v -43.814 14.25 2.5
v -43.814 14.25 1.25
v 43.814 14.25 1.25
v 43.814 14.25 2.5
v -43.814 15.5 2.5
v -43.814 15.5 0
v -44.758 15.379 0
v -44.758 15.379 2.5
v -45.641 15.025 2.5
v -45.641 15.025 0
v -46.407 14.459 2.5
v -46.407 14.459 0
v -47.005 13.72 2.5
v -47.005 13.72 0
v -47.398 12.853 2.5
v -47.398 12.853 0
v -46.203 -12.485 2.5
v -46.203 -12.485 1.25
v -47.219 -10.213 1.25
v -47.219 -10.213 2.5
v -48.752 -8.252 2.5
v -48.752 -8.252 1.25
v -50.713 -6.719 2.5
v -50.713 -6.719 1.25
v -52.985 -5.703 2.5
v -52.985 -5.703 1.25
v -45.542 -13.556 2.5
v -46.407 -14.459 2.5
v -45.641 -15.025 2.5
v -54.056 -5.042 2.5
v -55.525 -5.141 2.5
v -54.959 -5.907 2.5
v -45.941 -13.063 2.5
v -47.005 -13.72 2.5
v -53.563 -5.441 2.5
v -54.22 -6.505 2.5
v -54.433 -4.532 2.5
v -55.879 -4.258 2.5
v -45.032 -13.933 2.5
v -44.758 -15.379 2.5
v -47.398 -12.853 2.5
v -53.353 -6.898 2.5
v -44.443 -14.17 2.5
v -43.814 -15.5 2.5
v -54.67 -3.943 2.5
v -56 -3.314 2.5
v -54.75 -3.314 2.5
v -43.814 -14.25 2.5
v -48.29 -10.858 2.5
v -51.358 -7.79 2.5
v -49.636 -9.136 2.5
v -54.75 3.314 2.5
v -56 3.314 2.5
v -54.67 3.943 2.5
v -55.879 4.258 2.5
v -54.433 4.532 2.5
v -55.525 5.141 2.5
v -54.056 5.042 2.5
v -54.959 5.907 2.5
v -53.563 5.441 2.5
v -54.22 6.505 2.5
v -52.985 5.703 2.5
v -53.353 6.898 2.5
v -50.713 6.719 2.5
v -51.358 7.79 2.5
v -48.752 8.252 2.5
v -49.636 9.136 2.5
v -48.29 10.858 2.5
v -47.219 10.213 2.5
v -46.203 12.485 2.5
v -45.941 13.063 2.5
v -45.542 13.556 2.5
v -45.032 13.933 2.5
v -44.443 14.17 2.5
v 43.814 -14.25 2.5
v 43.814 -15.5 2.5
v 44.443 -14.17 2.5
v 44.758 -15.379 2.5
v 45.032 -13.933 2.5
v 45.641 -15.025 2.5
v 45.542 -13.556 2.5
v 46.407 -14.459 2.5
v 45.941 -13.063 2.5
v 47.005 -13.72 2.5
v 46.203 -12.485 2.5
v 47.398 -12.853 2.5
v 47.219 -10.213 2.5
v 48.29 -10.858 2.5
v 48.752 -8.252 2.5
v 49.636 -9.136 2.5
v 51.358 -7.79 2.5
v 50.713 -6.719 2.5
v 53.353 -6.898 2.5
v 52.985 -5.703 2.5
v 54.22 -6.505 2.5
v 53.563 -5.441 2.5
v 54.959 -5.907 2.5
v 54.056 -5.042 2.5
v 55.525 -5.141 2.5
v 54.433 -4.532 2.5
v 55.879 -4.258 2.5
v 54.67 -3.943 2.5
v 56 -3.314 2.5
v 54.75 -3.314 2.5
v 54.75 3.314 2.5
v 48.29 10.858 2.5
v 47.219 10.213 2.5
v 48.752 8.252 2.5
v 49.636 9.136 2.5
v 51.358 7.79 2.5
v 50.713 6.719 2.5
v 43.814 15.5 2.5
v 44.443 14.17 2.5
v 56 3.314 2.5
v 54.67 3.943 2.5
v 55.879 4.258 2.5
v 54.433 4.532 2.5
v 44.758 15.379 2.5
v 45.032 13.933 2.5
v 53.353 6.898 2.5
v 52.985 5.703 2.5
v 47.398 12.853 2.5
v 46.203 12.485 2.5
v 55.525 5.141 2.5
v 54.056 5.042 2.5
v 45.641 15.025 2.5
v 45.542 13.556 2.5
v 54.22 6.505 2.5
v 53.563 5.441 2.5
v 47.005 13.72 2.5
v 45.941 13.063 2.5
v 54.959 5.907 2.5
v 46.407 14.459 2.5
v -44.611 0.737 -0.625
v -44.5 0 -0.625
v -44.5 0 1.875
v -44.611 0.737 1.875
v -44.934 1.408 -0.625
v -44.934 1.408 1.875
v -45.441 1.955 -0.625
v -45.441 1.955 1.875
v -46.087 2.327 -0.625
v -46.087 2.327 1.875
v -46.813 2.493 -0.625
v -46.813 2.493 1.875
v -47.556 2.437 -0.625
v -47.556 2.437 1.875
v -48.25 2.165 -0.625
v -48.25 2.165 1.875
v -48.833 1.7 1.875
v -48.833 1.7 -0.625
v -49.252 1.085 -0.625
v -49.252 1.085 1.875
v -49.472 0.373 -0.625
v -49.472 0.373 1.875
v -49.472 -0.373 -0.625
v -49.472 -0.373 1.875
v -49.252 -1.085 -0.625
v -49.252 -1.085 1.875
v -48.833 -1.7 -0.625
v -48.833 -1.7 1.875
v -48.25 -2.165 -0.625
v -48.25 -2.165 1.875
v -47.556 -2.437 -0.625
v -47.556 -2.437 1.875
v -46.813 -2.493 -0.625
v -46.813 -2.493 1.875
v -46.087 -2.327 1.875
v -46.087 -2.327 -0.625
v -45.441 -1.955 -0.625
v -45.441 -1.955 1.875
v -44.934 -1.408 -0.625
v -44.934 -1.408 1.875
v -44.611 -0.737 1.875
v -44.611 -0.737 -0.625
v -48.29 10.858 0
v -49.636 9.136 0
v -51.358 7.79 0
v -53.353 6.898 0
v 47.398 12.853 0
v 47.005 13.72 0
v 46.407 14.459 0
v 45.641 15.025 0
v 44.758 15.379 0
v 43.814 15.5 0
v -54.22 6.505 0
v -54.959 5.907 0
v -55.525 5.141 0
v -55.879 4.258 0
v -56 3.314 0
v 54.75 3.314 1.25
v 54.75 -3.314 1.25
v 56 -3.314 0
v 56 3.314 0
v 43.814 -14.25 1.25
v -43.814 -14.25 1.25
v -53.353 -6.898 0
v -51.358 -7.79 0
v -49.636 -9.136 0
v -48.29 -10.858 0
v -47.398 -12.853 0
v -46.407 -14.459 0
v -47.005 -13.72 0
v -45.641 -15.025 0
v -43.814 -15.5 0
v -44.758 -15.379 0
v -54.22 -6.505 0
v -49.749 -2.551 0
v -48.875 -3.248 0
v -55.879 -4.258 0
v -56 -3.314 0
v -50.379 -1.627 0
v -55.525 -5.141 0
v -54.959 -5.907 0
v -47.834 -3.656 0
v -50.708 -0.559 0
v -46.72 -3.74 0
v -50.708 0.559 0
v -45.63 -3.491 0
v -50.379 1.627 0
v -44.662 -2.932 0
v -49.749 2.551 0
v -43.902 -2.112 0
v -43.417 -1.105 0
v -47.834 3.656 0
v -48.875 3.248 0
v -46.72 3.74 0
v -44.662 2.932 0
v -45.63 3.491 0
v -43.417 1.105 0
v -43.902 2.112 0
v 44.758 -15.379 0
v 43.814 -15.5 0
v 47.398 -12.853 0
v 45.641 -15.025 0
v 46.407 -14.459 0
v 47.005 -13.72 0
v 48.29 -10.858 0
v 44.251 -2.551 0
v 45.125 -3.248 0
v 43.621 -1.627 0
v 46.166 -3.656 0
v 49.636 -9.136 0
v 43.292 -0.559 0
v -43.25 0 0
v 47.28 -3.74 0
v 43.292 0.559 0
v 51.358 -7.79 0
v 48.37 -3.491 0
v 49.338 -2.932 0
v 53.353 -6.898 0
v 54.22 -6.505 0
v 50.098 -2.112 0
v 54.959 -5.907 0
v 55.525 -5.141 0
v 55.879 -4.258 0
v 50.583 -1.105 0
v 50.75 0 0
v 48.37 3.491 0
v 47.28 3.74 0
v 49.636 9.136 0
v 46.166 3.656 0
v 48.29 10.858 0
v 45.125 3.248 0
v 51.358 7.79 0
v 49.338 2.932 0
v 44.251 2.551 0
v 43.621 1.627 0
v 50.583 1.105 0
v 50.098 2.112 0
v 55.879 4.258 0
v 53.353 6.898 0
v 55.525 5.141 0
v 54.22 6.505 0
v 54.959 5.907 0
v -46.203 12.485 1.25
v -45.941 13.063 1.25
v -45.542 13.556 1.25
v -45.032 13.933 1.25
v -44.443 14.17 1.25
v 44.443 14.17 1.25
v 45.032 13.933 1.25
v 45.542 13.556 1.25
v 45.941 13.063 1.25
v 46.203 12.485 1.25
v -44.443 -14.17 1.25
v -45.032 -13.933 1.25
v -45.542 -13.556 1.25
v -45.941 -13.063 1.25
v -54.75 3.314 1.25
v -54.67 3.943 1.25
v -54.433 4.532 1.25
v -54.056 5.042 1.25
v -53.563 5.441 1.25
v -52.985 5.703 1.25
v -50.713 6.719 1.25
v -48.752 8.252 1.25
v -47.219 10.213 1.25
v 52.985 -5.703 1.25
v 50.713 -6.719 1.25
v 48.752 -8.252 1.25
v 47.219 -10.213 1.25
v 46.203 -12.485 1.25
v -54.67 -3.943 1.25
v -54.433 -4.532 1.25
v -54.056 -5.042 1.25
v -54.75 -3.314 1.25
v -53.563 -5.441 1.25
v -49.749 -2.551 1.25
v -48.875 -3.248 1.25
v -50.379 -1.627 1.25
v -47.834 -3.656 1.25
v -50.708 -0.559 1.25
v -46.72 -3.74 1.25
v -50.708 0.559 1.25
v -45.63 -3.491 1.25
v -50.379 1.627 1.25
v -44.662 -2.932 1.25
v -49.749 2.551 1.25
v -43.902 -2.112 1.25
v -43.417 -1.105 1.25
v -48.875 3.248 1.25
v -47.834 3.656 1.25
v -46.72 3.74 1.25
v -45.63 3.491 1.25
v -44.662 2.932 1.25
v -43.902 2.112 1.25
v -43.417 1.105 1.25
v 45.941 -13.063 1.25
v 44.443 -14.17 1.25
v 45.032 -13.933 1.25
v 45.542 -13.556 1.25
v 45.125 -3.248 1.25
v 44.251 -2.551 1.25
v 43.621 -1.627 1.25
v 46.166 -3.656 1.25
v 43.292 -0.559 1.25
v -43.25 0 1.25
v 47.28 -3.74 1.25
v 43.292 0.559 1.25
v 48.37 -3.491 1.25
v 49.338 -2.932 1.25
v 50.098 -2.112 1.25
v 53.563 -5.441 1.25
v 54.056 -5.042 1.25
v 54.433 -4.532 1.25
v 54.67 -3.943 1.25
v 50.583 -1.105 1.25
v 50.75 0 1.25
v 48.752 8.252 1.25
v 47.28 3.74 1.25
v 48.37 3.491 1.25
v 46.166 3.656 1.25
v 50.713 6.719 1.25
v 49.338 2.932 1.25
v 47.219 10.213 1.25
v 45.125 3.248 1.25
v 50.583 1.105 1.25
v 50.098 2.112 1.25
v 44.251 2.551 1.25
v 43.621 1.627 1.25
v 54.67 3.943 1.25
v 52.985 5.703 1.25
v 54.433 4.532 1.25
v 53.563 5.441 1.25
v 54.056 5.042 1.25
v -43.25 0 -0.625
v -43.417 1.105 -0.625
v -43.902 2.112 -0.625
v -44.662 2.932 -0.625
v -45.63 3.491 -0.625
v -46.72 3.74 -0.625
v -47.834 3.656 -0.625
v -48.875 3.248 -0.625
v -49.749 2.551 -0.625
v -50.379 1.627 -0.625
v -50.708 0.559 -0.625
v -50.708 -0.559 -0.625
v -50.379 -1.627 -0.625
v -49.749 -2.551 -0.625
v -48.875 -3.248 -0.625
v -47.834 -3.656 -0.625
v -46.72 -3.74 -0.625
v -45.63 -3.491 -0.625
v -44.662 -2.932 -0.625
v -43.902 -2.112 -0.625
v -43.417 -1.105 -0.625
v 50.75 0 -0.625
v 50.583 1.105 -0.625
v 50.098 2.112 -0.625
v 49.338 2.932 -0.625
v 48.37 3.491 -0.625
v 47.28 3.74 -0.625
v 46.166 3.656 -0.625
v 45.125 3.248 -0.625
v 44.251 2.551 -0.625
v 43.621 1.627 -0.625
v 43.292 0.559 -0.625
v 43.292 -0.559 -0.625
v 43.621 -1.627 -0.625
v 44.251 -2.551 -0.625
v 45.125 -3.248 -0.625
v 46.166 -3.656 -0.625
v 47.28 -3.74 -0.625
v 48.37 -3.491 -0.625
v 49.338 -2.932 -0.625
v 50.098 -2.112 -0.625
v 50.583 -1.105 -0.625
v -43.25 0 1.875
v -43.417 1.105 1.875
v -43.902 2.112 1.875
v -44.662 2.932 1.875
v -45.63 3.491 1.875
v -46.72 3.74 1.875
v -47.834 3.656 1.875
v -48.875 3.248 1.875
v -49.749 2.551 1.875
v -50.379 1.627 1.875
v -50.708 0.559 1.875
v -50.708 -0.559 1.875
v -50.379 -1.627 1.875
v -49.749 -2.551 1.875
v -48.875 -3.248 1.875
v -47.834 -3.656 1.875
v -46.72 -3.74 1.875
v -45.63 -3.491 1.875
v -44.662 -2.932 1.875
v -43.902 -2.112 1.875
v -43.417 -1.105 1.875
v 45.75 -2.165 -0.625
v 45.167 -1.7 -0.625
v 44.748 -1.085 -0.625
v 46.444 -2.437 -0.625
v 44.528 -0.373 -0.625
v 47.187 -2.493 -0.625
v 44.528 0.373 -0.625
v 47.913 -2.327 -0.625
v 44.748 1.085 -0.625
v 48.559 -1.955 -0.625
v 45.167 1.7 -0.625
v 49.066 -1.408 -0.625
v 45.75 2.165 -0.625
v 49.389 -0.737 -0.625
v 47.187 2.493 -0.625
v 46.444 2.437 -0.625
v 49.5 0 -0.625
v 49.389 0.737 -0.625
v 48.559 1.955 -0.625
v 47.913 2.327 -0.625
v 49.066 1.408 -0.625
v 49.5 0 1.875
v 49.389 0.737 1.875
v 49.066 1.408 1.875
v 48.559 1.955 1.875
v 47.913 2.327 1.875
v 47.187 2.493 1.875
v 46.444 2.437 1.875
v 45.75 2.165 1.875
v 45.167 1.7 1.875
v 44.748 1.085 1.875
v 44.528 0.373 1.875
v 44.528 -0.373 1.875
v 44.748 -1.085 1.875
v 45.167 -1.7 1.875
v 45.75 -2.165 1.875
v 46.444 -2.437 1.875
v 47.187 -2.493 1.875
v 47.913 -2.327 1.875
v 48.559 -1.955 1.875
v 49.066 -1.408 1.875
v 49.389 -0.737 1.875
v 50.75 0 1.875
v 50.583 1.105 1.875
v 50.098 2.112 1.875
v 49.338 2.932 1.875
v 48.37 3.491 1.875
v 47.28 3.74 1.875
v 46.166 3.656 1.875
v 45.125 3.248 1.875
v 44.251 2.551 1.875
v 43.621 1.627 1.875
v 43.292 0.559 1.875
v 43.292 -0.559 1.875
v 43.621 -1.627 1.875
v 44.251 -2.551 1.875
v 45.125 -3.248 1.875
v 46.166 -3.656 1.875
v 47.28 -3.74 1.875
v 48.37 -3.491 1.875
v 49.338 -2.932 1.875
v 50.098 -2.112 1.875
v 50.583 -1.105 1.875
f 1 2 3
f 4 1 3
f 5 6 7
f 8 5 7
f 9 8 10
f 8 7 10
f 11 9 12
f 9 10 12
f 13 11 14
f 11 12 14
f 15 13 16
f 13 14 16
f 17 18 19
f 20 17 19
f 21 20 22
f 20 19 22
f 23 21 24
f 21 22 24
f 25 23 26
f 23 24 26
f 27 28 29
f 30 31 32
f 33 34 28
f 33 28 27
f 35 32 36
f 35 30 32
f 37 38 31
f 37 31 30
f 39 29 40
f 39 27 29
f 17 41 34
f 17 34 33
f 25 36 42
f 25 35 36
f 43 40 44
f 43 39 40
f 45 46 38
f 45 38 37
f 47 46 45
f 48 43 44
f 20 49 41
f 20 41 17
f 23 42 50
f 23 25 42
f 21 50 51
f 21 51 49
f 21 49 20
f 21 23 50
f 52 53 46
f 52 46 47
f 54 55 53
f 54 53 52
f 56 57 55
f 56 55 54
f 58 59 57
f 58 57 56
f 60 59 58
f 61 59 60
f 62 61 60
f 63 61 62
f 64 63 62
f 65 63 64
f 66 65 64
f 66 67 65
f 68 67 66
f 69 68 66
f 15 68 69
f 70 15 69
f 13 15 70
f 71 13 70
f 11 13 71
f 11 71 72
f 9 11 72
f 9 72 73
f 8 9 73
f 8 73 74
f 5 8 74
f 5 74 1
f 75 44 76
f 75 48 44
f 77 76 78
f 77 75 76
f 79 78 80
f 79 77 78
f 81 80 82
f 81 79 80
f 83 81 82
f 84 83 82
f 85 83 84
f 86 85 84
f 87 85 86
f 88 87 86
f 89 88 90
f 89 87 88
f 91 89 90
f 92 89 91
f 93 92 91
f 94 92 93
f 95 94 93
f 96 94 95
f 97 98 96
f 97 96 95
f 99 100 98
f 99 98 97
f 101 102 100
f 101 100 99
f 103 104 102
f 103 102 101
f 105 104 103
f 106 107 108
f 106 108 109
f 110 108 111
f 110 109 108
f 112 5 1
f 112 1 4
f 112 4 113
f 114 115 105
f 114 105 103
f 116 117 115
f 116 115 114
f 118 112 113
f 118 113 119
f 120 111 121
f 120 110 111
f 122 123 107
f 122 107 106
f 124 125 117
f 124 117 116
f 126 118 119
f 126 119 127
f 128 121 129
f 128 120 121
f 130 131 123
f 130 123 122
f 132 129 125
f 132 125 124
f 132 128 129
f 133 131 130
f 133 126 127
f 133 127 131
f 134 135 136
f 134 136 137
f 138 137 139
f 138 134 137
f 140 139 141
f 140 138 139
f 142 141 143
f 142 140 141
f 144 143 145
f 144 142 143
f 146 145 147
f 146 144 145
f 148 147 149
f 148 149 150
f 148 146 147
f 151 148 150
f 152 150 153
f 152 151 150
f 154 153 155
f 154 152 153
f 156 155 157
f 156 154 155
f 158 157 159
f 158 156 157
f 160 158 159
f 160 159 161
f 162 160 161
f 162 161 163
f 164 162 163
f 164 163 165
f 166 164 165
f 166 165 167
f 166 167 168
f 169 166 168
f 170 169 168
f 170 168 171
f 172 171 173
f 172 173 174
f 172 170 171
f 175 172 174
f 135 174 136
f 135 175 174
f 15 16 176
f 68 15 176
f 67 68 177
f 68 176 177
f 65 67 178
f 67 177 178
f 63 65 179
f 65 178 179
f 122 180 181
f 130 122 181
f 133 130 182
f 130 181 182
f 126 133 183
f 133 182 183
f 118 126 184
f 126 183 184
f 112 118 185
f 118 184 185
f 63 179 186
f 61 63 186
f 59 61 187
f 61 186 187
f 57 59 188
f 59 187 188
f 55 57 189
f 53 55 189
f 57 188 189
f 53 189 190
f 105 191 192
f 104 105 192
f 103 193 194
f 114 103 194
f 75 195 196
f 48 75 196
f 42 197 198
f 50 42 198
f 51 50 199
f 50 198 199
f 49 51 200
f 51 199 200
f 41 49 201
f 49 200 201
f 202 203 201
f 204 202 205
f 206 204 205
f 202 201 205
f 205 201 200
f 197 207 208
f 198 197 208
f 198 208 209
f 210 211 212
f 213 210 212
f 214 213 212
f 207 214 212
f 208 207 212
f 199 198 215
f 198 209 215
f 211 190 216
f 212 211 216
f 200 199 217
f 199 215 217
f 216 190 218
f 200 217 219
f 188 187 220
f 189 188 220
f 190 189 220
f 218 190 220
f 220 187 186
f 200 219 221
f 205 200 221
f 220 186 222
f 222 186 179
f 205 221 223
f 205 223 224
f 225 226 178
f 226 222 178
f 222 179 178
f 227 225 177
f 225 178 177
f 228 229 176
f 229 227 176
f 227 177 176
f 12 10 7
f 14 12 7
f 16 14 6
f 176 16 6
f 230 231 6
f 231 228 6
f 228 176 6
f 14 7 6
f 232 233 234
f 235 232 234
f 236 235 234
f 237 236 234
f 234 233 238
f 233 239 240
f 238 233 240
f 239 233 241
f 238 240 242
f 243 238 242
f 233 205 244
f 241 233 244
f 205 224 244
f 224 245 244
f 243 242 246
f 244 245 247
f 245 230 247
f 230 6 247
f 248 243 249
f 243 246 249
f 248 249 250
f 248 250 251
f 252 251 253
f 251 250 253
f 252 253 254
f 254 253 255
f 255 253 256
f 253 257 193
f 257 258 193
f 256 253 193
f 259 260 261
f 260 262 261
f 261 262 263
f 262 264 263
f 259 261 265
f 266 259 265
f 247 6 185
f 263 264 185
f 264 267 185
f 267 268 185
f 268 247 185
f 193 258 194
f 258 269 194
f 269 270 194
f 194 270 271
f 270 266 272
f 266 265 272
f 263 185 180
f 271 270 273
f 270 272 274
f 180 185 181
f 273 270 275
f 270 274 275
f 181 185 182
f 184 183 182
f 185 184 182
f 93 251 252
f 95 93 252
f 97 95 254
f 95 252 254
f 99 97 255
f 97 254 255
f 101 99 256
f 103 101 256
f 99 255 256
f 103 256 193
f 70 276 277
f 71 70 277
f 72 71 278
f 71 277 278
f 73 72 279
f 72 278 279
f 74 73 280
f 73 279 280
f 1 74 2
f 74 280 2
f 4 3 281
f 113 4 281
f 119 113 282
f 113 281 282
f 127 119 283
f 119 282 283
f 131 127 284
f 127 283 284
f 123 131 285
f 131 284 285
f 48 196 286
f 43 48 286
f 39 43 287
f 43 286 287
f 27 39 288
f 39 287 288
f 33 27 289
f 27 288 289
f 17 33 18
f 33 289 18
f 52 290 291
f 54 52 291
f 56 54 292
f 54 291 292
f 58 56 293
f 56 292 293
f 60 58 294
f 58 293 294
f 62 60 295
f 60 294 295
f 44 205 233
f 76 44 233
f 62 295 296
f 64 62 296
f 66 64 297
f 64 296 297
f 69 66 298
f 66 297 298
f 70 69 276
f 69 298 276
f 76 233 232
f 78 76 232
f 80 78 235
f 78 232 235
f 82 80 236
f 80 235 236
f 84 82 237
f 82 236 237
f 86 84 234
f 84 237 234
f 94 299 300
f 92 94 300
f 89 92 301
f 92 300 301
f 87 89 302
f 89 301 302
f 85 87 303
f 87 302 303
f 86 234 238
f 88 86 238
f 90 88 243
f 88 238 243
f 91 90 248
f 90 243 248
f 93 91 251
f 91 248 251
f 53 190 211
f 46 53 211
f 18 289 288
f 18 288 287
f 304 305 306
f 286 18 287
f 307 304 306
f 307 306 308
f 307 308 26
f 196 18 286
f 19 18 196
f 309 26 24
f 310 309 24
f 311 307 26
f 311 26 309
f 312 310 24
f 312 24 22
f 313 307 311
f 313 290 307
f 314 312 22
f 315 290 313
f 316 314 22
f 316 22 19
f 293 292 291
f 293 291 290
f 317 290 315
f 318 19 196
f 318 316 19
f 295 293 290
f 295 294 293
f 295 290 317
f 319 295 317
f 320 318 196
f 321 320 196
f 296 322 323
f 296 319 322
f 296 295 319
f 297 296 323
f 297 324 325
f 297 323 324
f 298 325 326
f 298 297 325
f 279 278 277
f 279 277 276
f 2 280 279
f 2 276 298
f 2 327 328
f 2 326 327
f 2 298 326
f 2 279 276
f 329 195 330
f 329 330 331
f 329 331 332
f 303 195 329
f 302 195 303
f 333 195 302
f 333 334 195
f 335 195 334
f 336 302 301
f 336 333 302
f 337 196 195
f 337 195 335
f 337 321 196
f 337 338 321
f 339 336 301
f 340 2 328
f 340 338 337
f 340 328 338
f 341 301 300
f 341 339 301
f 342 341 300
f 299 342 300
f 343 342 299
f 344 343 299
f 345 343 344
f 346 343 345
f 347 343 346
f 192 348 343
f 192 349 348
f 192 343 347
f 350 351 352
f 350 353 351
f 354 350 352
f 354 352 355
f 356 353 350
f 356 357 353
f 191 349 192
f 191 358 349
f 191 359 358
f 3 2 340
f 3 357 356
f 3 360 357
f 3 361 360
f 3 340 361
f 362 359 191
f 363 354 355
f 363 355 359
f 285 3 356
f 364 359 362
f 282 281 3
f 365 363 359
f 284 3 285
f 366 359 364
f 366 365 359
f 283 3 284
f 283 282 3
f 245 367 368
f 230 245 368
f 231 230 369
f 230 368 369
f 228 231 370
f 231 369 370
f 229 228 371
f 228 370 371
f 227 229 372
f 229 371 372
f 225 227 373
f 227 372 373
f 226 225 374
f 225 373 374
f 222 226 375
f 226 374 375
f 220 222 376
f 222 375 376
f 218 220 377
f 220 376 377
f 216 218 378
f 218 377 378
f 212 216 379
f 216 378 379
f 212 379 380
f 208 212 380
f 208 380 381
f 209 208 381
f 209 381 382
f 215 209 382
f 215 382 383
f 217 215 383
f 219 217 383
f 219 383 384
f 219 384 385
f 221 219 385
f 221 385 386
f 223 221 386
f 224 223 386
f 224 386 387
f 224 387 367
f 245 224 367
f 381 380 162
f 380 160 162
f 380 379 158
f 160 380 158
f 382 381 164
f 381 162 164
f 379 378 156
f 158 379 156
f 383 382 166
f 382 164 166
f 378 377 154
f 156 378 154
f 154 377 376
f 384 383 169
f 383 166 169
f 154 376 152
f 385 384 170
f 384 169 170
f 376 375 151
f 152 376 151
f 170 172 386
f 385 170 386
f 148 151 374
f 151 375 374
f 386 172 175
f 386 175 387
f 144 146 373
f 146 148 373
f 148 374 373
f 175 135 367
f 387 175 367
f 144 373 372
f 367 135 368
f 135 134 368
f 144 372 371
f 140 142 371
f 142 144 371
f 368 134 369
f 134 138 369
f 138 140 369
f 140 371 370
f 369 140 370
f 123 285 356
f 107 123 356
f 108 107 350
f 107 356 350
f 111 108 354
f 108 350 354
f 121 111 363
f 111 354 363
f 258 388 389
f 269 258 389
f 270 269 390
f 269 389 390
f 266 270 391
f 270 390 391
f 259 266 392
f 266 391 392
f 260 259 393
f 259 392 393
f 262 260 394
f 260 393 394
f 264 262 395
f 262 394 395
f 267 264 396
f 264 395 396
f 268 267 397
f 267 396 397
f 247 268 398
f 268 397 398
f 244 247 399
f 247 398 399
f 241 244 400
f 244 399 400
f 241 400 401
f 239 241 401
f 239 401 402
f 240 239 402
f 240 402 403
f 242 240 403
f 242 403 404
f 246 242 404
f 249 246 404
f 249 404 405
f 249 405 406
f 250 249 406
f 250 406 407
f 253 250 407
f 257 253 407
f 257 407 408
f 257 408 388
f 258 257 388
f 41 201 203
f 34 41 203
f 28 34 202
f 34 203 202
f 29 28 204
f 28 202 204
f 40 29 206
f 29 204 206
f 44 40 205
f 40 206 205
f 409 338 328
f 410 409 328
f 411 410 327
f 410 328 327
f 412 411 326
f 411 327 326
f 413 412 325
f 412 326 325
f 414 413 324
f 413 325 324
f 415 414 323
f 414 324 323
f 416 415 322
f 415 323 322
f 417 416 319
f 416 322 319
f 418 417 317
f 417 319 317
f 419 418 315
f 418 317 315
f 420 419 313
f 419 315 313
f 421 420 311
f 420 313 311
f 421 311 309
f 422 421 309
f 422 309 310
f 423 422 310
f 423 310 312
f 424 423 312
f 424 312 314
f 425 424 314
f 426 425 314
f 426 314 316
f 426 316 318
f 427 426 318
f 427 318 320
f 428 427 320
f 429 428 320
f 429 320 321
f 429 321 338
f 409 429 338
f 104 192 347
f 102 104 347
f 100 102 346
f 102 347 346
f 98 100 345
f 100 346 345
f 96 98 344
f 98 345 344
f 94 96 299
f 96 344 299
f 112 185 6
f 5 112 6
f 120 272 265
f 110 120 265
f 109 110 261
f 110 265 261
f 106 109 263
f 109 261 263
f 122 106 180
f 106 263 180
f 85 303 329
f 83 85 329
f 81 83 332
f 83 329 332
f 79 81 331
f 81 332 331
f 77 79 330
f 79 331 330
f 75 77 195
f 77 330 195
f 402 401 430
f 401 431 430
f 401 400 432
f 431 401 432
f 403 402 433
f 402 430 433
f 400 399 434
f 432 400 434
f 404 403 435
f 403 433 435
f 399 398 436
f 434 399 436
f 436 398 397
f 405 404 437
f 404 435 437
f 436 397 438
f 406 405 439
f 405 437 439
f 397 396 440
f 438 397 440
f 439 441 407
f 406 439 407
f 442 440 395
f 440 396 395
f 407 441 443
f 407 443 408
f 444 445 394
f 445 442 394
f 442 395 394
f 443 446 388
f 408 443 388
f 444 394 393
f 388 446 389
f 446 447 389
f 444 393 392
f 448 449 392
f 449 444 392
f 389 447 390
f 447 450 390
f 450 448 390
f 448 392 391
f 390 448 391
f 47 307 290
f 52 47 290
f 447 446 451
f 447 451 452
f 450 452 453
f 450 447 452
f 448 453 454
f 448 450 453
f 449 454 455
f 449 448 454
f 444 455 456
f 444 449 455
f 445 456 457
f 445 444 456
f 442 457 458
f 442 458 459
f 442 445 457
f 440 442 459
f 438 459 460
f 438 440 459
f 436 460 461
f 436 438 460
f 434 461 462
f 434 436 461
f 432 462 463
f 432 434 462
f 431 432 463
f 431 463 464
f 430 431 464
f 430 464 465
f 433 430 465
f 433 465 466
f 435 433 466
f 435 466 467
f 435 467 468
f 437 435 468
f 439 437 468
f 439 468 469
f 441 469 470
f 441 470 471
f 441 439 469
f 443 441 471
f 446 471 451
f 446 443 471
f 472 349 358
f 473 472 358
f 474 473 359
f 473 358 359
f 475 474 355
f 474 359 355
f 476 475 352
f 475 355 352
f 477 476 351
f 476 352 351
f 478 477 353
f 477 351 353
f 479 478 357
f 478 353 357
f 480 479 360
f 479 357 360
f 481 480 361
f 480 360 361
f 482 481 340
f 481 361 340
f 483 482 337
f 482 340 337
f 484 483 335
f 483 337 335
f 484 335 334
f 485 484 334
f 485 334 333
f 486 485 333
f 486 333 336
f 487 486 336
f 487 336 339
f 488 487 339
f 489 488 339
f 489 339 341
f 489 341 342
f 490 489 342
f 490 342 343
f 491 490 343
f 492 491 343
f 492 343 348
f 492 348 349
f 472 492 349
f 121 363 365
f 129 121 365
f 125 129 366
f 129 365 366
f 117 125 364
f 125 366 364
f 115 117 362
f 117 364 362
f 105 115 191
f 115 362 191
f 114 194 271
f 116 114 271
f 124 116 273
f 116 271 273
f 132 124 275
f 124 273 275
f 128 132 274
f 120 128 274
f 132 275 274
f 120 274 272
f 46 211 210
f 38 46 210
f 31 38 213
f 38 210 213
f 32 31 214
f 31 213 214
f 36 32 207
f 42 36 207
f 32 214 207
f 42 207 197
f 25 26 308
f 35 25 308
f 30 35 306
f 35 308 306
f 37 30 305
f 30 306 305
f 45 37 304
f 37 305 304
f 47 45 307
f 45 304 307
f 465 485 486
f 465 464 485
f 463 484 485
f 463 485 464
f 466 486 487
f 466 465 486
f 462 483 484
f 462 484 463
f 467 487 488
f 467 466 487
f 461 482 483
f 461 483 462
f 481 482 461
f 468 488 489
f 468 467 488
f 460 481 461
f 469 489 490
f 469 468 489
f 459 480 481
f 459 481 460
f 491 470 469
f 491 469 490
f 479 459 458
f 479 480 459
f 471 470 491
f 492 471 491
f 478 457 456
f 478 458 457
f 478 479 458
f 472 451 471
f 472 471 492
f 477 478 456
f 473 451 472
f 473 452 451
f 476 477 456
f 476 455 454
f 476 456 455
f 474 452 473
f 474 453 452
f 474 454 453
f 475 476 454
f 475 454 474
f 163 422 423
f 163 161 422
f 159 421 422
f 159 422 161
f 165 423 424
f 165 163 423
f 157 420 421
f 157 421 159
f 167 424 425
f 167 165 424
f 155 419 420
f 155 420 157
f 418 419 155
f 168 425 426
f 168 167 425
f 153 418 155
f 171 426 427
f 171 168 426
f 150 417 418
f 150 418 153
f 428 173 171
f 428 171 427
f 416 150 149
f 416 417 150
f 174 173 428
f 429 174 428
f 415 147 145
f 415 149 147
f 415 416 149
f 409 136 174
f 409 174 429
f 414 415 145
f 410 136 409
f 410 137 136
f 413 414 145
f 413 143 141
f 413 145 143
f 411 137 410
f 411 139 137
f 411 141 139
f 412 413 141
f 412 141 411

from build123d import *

# Parameters (mm, degrees)
BOSS_EXTRUDE1_DEPTH      = 2.5
SKETCH1_3_R              = 3.75
BOSS_EXTRUDE2_DEPTH      = 1.25
BOSS_EXTRUDE4_DEPTH      = 1.875
BOSS_EXTRUDE4_DEPTH_BACK = 0.625
SKETCH1_4_R              = 3.75
SKETCH1_4_R_2            = 2.5


with BuildPart() as part:
    # Sketch1 → Boss-Extrude1 (new body)
    with BuildSketch(Plane.XY):
        with BuildLine():
            ThreePointArc((-53.352941176, 6.898076983), (-55.26649875, 5.541774365), (-56, 3.313942393))
            Line((-56, 3.313942393), (-56, -3.313942393))
            ThreePointArc((-56, -3.313942393), (-55.26649875, -5.541774365), (-53.352941176, -6.898076983))
            ThreePointArc((-53.352941176, -6.898076983), (-49.636038969, -9.136038969), (-47.398076983, -12.852941176))
            ThreePointArc((-47.398076983, -12.852941176), (-46.041774365, -14.76649875), (-43.813942393, -15.5))
            Line((-43.813942393, -15.5), (0, -15.5))
            Line((0, -15.5), (43.813942393, -15.5))
            ThreePointArc((43.813942393, -15.5), (46.041774365, -14.76649875), (47.398076983, -12.852941176))
            ThreePointArc((47.398076983, -12.852941176), (49.636038969, -9.136038969), (53.352941176, -6.898076983))
            ThreePointArc((53.352941176, -6.898076983), (55.26649875, -5.541774365), (56, -3.313942393))
            Line((56, -3.313942393), (56, 3.313942393))
            ThreePointArc((56, 3.313942393), (55.26649875, 5.541774365), (53.352941176, 6.898076983))
            ThreePointArc((53.352941176, 6.898076983), (49.636038969, 9.136038969), (47.398076983, 12.852941176))
            ThreePointArc((47.398076983, 12.852941176), (46.041774365, 14.76649875), (43.813942393, 15.5))
            Line((43.813942393, 15.5), (0, 15.5))
            Line((0, 15.5), (-43.813942393, 15.5))
            ThreePointArc((-43.813942393, 15.5), (-46.041774365, 14.76649875), (-47.398076983, 12.852941176))
            ThreePointArc((-47.398076983, 12.852941176), (-49.636038969, 9.136038969), (-53.352941176, 6.898076983))
        make_face()
        with BuildLine():
            Line((43.813942393, -14.25), (0, -14.25))
            Line((0, -14.25), (-43.813942393, -14.25))
            ThreePointArc((-43.813942393, -14.25), (-45.299163708, -13.760999166), (-46.203365453, -12.485294118))
            ThreePointArc((-46.203365453, -12.485294118), (-48.752155493, -8.252155493), (-52.985294118, -5.703365453))
            ThreePointArc((-52.985294118, -5.703365453), (-54.260999166, -4.799163708), (-54.75, -3.313942393))
            Line((-54.75, -3.313942393), (-54.75, 3.313942393))
            ThreePointArc((-54.75, 3.313942393), (-54.260999166, 4.799163708), (-52.985294118, 5.703365453))
            ThreePointArc((-52.985294118, 5.703365453), (-48.752155493, 8.252155493), (-46.203365453, 12.485294118))
            ThreePointArc((-46.203365453, 12.485294118), (-45.299163708, 13.760999166), (-43.813942393, 14.25))
            Line((-43.813942393, 14.25), (0, 14.25))
            Line((0, 14.25), (43.813942393, 14.25))
            ThreePointArc((43.813942393, 14.25), (45.299163708, 13.760999166), (46.203365453, 12.485294118))
            ThreePointArc((46.203365453, 12.485294118), (48.752155493, 8.252155493), (52.985294118, 5.703365453))
            ThreePointArc((52.985294118, 5.703365453), (54.260999166, 4.799163708), (54.75, 3.313942393))
            Line((54.75, 3.313942393), (54.75, -3.313942393))
            ThreePointArc((54.75, -3.313942393), (54.260999166, -4.799163708), (52.985294118, -5.703365453))
            ThreePointArc((52.985294118, -5.703365453), (48.752155493, -8.252155493), (46.203365453, -12.485294118))
            ThreePointArc((46.203365453, -12.485294118), (45.299163708, -13.760999166), (43.813942393, -14.25))
        make_face(mode=Mode.SUBTRACT)
    extrude(amount=BOSS_EXTRUDE1_DEPTH)

    # Sketch1<3> → Boss-Extrude2 (add)
    with BuildSketch(Plane.XY):
        with BuildLine():
            Line((-43.813942393, -14.25), (0, -14.25))
            Line((0, -14.25), (43.813942393, -14.25))
            ThreePointArc((43.813942393, -14.25), (45.299163708, -13.760999166), (46.203365453, -12.485294118))
            ThreePointArc((46.203365453, -12.485294118), (48.752155493, -8.252155493), (52.985294118, -5.703365453))
            ThreePointArc((52.985294118, -5.703365453), (54.260999166, -4.799163708), (54.75, -3.313942393))
            Line((54.75, -3.313942393), (54.75, 3.313942393))
            ThreePointArc((54.75, 3.313942393), (54.260999166, 4.799163708), (52.985294118, 5.703365453))
            ThreePointArc((52.985294118, 5.703365453), (48.752155493, 8.252155493), (46.203365453, 12.485294118))
            ThreePointArc((46.203365453, 12.485294118), (45.299163708, 13.760999166), (43.813942393, 14.25))
            Line((43.813942393, 14.25), (0, 14.25))
            Line((0, 14.25), (-43.813942393, 14.25))
            ThreePointArc((-43.813942393, 14.25), (-45.299163708, 13.760999166), (-46.203365453, 12.485294118))
            ThreePointArc((-46.203365453, 12.485294118), (-48.752155493, 8.252155493), (-52.985294118, 5.703365453))
            ThreePointArc((-52.985294118, 5.703365453), (-54.260999166, 4.799163708), (-54.75, 3.313942393))
            Line((-54.75, 3.313942393), (-54.75, -3.313942393))
            ThreePointArc((-54.75, -3.313942393), (-54.260999166, -4.799163708), (-52.985294118, -5.703365453))
            ThreePointArc((-52.985294118, -5.703365453), (-48.752155493, -8.252155493), (-46.203365453, -12.485294118))
            ThreePointArc((-46.203365453, -12.485294118), (-45.299163708, -13.760999166), (-43.813942393, -14.25))
        make_face()
        with Locations((-47, 0)):
            Circle(SKETCH1_3_R, mode=Mode.SUBTRACT)
        with Locations((47, 0)):
            Circle(SKETCH1_3_R, mode=Mode.SUBTRACT)
    extrude(amount=BOSS_EXTRUDE2_DEPTH)

    # Sketch1<4> → Boss-Extrude4 (add, two sides: drawn at the far end of the back side and taken through both)
    # profile 1 of 2: a face of its own
    with BuildSketch(Plane.XY.offset(-BOSS_EXTRUDE4_DEPTH_BACK)):
        with Locations((-47, 0)):
            Circle(SKETCH1_4_R)
        with Locations((-47, 0)):
            Circle(SKETCH1_4_R_2, mode=Mode.SUBTRACT)
    # profile 2 of 2: a face of its own
    with BuildSketch(Plane.XY.offset(-BOSS_EXTRUDE4_DEPTH_BACK)):
        with Locations((47, 0)):
            Circle(SKETCH1_4_R)
        with Locations((47, 0)):
            Circle(SKETCH1_4_R_2, mode=Mode.SUBTRACT)
    extrude(amount=BOSS_EXTRUDE4_DEPTH + BOSS_EXTRUDE4_DEPTH_BACK)


solid = part.part
